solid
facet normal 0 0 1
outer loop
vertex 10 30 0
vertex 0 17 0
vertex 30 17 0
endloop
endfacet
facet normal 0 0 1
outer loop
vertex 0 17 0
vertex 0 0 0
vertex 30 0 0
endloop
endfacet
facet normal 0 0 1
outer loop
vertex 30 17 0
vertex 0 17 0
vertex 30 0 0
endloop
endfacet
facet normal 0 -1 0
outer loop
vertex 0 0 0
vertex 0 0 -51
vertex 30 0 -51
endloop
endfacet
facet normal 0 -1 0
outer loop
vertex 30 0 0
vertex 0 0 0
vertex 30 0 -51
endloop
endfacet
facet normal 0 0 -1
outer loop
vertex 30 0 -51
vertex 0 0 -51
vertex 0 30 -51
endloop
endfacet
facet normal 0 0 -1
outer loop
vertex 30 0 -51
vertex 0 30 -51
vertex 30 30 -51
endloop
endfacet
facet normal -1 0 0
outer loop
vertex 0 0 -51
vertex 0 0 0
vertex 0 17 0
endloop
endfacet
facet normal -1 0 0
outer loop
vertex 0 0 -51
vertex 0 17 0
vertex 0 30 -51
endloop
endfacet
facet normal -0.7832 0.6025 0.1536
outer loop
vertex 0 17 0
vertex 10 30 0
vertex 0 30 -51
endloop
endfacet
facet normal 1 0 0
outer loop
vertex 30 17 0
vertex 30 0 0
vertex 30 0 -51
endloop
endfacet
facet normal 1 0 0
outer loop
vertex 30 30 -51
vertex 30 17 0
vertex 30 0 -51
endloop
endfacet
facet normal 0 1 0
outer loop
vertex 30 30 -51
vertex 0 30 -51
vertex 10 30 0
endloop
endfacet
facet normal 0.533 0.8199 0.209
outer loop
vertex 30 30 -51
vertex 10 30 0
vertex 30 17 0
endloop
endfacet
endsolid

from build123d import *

# Parameters (mm, degrees)
SKETCH2_W           = 30
SKETCH2_H           = 51
BOSS_EXTRUDE1_DEPTH = 30


with BuildPart() as part:
    # Sketch2 → Boss-Extrude1 (new body)
    with BuildSketch(Plane(origin=(0, 0, 0), x_dir=(1, 0, 0), z_dir=(0, 1, 0))):
        with Locations((15, 25.5)):
            Rectangle(SKETCH2_W, SKETCH2_H)
    extrude(amount=BOSS_EXTRUDE1_DEPTH)

    # SurfaceCut2
    split(bisect_by=Plane(origin=(15.949847794, 24.538227375, 6.254842272), x_dir=(0.8461451498623624, -0.5164387356010117, -0.1316412463296696), z_dir=(0.5329525169885216, 0.8199269492131106, 0.20900098705432213)), keep=Keep.BOTTOM)

    # SurfaceCut3
    split(bisect_by=Plane(origin=(-8.02185135, 6.170654885, 1.572912029), x_dir=(-0.1217254970638359, 0.09363499774141223, -0.9881373338572569), z_dir=(0.7832213553451228, -0.6024779656500949, -0.15357281477355358)), keep=Keep.TOP)


solid = part.part
